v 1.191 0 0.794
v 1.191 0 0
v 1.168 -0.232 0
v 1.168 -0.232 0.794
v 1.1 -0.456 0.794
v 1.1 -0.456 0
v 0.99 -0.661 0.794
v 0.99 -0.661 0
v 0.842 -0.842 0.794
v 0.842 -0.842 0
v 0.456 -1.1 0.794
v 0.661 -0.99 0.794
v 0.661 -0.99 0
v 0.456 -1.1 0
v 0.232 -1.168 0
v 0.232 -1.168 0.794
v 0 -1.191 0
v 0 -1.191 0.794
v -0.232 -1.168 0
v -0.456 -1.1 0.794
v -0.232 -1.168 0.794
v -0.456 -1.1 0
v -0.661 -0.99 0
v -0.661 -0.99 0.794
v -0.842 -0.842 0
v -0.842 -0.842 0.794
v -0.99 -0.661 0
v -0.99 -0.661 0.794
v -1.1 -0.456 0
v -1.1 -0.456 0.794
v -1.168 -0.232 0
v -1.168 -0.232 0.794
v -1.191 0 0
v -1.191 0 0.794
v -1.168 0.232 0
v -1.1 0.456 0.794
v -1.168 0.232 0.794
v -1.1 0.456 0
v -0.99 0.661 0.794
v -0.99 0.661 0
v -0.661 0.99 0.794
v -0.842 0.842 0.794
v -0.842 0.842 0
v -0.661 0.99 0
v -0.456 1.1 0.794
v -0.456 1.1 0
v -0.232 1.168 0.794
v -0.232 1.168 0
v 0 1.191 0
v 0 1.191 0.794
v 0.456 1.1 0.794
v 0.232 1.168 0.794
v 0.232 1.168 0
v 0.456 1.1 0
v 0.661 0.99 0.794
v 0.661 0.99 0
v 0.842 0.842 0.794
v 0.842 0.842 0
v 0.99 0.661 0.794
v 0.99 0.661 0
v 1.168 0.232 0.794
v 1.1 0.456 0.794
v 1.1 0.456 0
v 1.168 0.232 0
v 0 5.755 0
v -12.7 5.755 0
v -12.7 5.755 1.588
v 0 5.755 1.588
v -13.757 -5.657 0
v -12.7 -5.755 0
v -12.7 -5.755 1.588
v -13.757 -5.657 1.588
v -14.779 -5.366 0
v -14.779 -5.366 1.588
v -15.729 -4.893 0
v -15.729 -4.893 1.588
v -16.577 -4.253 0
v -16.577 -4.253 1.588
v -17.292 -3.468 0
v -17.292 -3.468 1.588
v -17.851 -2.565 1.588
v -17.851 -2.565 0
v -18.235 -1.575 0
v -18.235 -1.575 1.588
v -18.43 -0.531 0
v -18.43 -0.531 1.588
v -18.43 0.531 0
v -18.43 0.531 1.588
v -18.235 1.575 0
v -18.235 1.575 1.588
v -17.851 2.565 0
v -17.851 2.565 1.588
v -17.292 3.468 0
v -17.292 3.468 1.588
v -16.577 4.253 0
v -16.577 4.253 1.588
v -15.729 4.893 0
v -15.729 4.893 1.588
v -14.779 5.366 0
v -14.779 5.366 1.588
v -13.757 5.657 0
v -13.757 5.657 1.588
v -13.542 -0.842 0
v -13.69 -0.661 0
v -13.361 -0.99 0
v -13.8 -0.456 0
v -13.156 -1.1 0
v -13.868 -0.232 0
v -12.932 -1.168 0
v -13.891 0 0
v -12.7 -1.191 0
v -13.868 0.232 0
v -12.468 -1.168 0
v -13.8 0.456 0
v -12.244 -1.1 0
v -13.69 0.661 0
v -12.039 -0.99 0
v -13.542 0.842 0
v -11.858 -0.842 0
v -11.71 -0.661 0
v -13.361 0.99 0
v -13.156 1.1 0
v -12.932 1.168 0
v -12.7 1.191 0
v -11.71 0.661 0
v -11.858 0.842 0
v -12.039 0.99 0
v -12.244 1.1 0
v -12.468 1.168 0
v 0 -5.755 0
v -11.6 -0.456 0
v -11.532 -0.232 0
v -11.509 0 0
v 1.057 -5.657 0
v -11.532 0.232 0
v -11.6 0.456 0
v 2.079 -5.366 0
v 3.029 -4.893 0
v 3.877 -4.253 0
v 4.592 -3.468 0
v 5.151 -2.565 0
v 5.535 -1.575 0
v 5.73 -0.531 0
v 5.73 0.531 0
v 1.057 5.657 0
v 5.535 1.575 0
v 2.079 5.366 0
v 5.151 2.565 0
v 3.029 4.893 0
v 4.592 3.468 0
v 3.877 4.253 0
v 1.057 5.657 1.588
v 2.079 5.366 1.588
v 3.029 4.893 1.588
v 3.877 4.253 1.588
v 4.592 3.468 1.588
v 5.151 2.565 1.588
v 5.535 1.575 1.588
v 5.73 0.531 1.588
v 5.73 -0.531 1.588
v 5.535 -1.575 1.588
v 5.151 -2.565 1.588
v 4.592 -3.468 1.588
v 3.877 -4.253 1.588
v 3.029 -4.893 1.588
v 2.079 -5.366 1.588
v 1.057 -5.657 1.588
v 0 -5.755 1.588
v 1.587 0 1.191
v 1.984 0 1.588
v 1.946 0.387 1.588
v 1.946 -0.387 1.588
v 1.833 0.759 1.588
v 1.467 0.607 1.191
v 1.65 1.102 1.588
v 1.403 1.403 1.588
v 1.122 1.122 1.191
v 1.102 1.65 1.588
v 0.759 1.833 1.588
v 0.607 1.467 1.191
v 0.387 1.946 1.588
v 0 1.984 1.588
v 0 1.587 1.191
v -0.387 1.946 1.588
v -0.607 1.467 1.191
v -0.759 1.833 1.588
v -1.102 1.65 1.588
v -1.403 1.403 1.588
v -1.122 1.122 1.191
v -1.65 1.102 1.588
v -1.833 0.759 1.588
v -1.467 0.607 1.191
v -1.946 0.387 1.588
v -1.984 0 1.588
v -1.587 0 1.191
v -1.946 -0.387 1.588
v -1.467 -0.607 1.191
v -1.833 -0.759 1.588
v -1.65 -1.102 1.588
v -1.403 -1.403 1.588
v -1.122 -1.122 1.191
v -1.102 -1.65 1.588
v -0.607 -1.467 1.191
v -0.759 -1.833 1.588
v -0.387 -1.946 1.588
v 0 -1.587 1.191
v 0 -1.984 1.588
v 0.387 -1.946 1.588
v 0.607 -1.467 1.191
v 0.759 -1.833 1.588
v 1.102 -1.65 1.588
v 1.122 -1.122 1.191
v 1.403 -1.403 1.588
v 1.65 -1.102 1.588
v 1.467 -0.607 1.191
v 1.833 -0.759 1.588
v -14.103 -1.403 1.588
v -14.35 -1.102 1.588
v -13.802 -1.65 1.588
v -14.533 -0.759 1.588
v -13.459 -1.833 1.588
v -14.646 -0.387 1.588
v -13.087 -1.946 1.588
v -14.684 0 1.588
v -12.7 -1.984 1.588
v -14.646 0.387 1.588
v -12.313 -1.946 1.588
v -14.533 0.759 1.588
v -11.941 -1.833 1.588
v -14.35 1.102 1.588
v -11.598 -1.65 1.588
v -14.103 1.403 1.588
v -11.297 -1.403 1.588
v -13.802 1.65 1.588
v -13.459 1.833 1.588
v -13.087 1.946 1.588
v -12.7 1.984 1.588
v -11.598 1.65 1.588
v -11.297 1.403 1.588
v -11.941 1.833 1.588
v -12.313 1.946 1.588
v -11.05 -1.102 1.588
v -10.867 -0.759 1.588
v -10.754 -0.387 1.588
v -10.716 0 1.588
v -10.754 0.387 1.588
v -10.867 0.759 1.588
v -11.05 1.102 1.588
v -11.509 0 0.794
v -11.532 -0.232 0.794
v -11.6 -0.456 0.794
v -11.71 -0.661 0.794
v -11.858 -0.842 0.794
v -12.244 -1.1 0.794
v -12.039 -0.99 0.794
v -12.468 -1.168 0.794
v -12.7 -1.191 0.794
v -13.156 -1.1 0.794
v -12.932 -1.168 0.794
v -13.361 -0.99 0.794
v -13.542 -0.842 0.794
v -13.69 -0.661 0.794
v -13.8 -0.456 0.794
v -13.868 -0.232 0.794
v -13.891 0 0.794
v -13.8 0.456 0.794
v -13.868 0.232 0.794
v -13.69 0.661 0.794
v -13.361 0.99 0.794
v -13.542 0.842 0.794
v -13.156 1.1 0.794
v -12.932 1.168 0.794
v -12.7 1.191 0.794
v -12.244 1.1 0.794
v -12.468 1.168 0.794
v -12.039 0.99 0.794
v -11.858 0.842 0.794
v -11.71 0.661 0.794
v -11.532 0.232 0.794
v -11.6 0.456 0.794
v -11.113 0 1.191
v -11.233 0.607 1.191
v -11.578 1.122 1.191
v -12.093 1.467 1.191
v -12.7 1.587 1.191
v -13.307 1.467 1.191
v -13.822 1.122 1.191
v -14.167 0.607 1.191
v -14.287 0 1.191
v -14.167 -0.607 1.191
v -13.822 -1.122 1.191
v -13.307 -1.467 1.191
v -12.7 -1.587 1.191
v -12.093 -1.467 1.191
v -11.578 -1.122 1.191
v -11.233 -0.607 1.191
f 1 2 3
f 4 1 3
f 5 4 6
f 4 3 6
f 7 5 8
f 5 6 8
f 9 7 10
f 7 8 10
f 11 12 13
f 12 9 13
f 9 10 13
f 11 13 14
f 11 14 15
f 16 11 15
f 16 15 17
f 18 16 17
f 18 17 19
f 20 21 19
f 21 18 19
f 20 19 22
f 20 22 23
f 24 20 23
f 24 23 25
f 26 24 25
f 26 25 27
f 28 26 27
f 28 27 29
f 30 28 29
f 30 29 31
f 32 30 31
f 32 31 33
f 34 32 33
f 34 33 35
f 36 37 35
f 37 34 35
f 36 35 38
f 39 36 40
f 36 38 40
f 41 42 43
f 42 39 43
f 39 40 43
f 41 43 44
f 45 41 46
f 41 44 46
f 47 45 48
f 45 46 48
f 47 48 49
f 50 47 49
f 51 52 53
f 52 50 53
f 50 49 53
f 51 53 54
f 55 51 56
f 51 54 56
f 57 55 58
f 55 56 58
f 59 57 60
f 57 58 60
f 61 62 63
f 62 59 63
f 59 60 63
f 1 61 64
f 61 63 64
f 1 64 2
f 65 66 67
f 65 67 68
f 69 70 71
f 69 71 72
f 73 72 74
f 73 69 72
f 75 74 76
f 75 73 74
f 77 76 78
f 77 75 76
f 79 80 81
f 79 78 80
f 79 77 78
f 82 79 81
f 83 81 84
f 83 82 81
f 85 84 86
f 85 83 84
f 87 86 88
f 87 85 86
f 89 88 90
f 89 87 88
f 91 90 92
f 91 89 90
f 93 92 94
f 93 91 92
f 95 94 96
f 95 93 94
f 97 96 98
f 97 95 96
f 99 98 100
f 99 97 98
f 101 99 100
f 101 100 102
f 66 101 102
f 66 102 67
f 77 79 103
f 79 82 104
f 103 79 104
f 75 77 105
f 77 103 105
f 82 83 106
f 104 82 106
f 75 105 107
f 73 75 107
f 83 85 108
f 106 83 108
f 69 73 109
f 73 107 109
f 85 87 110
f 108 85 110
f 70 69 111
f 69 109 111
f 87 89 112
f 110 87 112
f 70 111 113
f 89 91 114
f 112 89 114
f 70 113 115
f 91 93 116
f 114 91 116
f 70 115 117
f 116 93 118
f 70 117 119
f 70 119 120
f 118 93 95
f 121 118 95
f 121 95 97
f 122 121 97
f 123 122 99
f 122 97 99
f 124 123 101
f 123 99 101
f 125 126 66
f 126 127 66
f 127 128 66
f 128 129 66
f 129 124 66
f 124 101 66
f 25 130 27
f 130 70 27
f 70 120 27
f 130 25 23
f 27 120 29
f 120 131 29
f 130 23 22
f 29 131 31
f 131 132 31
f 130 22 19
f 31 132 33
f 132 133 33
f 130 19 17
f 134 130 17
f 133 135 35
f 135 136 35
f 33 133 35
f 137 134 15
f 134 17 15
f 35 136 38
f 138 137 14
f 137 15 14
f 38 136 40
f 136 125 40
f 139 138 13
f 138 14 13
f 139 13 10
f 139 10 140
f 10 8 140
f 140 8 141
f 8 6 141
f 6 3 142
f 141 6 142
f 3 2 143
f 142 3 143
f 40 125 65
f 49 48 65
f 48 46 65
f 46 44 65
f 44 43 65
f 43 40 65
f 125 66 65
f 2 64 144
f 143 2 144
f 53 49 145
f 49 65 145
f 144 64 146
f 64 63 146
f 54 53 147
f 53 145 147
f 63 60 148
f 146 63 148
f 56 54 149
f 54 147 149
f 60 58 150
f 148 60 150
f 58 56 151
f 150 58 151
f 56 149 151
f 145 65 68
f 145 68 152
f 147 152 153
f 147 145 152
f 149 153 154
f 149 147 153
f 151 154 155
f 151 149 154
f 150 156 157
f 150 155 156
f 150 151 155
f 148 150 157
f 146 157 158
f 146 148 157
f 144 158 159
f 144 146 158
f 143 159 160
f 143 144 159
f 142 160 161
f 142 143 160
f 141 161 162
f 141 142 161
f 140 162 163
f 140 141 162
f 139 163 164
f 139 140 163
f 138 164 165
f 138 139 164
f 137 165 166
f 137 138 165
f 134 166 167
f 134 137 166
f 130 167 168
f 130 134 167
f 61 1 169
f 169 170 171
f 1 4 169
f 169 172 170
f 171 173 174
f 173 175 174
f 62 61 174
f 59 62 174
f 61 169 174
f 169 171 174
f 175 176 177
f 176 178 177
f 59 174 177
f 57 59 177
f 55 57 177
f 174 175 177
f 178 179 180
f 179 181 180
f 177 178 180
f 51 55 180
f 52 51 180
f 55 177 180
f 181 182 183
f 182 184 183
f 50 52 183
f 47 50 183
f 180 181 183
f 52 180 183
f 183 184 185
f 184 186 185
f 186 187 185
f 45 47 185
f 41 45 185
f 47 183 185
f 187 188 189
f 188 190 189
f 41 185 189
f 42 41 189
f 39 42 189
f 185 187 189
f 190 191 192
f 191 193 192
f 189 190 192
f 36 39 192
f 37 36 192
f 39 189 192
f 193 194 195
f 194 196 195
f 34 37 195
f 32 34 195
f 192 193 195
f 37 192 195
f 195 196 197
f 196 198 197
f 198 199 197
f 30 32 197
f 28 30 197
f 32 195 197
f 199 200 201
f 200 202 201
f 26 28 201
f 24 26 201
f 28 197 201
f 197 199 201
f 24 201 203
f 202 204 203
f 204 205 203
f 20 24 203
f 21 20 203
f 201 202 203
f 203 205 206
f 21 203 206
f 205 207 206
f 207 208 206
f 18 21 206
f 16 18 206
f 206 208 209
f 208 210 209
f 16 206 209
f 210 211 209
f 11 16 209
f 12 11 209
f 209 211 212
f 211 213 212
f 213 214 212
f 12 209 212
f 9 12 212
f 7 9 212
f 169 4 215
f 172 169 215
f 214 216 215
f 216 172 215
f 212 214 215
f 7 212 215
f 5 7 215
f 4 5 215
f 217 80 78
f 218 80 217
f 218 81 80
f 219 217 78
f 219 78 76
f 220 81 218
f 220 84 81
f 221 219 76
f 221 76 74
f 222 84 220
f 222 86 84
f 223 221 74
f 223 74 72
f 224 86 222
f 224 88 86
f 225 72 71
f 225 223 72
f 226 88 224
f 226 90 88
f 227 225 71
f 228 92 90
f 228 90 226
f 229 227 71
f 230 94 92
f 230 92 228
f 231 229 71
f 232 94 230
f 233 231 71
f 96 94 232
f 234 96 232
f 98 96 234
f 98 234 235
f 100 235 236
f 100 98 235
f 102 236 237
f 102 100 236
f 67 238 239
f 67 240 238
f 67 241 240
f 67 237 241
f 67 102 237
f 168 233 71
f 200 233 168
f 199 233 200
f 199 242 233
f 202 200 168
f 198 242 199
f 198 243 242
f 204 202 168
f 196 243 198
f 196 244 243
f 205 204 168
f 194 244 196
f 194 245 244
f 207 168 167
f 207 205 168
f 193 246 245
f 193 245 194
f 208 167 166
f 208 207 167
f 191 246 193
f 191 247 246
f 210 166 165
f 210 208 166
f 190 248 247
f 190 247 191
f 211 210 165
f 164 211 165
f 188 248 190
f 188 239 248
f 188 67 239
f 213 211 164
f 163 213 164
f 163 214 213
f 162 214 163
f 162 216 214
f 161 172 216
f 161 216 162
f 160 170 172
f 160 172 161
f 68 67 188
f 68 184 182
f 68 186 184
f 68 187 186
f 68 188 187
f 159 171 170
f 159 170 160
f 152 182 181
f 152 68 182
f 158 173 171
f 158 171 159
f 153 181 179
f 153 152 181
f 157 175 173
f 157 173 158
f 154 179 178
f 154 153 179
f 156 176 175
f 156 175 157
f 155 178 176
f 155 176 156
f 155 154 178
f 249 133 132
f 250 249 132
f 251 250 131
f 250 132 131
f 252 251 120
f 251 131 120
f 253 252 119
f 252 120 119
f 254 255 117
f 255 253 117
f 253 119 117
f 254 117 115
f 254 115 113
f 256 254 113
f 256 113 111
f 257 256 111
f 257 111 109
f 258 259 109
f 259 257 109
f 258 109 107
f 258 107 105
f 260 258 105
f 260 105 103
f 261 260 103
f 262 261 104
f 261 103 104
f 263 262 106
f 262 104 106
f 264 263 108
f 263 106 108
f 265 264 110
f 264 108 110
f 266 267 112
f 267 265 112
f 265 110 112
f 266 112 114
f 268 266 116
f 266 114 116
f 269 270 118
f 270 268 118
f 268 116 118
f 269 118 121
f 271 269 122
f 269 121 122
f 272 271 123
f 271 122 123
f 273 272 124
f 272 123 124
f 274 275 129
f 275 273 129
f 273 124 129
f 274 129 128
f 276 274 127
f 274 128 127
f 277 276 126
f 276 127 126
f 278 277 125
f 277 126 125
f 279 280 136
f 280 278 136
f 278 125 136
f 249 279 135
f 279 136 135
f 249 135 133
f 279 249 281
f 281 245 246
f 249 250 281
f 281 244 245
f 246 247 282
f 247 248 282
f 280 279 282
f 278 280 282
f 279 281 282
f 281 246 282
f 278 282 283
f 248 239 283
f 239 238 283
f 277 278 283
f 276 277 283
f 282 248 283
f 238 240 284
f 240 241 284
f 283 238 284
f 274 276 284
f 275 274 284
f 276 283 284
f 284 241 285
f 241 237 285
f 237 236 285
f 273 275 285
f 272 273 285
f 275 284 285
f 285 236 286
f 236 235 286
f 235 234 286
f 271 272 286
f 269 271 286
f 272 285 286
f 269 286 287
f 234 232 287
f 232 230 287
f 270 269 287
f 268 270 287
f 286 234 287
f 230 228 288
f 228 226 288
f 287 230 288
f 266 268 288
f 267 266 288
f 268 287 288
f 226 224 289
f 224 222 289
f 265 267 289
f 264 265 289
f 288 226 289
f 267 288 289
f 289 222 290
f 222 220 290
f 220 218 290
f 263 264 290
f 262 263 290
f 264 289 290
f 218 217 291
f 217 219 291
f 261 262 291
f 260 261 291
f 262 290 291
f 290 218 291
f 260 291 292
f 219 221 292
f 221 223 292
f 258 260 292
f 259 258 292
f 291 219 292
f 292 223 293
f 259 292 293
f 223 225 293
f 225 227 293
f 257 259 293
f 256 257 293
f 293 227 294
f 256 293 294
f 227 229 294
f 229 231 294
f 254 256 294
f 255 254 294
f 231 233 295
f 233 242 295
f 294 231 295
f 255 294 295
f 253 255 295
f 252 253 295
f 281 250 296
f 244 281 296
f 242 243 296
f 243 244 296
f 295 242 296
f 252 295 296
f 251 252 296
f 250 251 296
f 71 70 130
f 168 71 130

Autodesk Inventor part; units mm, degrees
ref_plane "YZ Plane" through (0, 0, 0) normal (1, 0, 0) x (0, 1, 0)
ref_plane "XZ Plane" through (0, 0, 0) normal (0, 1, 0) x (-1, 0, 0)
ref_plane "XY Plane" through (0, 0, 0) normal (0, 0, 1) x (1, 0, 0)
sketch "Sketch36" plane through (0, 0, 0) normal (0, 0, 1) x (1, 0, 0)
  arc A0 (0, -5.7547) -> (0, 5.7547) centre (0, 0) ccw
  arc A1 (-12.7, 5.7547) -> (-12.7, -5.7547) centre (-12.7, 0) ccw
  line L0 (-12.7, 5.7547) -> (0, 5.7547)
  line L1 (-12.7, -5.7547) -> (0, -5.7547)
  circle A2 centre (-12.7, 0) radius 1.1906
  circle A3 centre (0, 0) radius 1.1906
  dimension "d158" = 11.5094
  dimension "d160" = 12.7
  dimension "d162" = 2.3813
  dimension "d163" = 2.3813
  dimension "d176" = 5.7547
extrude "Extrusion36" add sketch "Sketch36" along normal blind 1.5875
chamfer "Chamfer2" distance 0.7937 angle 45 2 edges at (-13.8906, 0, 1.5875) (-1.1906, 0, 1.5875)
properties part number "arm-top"
